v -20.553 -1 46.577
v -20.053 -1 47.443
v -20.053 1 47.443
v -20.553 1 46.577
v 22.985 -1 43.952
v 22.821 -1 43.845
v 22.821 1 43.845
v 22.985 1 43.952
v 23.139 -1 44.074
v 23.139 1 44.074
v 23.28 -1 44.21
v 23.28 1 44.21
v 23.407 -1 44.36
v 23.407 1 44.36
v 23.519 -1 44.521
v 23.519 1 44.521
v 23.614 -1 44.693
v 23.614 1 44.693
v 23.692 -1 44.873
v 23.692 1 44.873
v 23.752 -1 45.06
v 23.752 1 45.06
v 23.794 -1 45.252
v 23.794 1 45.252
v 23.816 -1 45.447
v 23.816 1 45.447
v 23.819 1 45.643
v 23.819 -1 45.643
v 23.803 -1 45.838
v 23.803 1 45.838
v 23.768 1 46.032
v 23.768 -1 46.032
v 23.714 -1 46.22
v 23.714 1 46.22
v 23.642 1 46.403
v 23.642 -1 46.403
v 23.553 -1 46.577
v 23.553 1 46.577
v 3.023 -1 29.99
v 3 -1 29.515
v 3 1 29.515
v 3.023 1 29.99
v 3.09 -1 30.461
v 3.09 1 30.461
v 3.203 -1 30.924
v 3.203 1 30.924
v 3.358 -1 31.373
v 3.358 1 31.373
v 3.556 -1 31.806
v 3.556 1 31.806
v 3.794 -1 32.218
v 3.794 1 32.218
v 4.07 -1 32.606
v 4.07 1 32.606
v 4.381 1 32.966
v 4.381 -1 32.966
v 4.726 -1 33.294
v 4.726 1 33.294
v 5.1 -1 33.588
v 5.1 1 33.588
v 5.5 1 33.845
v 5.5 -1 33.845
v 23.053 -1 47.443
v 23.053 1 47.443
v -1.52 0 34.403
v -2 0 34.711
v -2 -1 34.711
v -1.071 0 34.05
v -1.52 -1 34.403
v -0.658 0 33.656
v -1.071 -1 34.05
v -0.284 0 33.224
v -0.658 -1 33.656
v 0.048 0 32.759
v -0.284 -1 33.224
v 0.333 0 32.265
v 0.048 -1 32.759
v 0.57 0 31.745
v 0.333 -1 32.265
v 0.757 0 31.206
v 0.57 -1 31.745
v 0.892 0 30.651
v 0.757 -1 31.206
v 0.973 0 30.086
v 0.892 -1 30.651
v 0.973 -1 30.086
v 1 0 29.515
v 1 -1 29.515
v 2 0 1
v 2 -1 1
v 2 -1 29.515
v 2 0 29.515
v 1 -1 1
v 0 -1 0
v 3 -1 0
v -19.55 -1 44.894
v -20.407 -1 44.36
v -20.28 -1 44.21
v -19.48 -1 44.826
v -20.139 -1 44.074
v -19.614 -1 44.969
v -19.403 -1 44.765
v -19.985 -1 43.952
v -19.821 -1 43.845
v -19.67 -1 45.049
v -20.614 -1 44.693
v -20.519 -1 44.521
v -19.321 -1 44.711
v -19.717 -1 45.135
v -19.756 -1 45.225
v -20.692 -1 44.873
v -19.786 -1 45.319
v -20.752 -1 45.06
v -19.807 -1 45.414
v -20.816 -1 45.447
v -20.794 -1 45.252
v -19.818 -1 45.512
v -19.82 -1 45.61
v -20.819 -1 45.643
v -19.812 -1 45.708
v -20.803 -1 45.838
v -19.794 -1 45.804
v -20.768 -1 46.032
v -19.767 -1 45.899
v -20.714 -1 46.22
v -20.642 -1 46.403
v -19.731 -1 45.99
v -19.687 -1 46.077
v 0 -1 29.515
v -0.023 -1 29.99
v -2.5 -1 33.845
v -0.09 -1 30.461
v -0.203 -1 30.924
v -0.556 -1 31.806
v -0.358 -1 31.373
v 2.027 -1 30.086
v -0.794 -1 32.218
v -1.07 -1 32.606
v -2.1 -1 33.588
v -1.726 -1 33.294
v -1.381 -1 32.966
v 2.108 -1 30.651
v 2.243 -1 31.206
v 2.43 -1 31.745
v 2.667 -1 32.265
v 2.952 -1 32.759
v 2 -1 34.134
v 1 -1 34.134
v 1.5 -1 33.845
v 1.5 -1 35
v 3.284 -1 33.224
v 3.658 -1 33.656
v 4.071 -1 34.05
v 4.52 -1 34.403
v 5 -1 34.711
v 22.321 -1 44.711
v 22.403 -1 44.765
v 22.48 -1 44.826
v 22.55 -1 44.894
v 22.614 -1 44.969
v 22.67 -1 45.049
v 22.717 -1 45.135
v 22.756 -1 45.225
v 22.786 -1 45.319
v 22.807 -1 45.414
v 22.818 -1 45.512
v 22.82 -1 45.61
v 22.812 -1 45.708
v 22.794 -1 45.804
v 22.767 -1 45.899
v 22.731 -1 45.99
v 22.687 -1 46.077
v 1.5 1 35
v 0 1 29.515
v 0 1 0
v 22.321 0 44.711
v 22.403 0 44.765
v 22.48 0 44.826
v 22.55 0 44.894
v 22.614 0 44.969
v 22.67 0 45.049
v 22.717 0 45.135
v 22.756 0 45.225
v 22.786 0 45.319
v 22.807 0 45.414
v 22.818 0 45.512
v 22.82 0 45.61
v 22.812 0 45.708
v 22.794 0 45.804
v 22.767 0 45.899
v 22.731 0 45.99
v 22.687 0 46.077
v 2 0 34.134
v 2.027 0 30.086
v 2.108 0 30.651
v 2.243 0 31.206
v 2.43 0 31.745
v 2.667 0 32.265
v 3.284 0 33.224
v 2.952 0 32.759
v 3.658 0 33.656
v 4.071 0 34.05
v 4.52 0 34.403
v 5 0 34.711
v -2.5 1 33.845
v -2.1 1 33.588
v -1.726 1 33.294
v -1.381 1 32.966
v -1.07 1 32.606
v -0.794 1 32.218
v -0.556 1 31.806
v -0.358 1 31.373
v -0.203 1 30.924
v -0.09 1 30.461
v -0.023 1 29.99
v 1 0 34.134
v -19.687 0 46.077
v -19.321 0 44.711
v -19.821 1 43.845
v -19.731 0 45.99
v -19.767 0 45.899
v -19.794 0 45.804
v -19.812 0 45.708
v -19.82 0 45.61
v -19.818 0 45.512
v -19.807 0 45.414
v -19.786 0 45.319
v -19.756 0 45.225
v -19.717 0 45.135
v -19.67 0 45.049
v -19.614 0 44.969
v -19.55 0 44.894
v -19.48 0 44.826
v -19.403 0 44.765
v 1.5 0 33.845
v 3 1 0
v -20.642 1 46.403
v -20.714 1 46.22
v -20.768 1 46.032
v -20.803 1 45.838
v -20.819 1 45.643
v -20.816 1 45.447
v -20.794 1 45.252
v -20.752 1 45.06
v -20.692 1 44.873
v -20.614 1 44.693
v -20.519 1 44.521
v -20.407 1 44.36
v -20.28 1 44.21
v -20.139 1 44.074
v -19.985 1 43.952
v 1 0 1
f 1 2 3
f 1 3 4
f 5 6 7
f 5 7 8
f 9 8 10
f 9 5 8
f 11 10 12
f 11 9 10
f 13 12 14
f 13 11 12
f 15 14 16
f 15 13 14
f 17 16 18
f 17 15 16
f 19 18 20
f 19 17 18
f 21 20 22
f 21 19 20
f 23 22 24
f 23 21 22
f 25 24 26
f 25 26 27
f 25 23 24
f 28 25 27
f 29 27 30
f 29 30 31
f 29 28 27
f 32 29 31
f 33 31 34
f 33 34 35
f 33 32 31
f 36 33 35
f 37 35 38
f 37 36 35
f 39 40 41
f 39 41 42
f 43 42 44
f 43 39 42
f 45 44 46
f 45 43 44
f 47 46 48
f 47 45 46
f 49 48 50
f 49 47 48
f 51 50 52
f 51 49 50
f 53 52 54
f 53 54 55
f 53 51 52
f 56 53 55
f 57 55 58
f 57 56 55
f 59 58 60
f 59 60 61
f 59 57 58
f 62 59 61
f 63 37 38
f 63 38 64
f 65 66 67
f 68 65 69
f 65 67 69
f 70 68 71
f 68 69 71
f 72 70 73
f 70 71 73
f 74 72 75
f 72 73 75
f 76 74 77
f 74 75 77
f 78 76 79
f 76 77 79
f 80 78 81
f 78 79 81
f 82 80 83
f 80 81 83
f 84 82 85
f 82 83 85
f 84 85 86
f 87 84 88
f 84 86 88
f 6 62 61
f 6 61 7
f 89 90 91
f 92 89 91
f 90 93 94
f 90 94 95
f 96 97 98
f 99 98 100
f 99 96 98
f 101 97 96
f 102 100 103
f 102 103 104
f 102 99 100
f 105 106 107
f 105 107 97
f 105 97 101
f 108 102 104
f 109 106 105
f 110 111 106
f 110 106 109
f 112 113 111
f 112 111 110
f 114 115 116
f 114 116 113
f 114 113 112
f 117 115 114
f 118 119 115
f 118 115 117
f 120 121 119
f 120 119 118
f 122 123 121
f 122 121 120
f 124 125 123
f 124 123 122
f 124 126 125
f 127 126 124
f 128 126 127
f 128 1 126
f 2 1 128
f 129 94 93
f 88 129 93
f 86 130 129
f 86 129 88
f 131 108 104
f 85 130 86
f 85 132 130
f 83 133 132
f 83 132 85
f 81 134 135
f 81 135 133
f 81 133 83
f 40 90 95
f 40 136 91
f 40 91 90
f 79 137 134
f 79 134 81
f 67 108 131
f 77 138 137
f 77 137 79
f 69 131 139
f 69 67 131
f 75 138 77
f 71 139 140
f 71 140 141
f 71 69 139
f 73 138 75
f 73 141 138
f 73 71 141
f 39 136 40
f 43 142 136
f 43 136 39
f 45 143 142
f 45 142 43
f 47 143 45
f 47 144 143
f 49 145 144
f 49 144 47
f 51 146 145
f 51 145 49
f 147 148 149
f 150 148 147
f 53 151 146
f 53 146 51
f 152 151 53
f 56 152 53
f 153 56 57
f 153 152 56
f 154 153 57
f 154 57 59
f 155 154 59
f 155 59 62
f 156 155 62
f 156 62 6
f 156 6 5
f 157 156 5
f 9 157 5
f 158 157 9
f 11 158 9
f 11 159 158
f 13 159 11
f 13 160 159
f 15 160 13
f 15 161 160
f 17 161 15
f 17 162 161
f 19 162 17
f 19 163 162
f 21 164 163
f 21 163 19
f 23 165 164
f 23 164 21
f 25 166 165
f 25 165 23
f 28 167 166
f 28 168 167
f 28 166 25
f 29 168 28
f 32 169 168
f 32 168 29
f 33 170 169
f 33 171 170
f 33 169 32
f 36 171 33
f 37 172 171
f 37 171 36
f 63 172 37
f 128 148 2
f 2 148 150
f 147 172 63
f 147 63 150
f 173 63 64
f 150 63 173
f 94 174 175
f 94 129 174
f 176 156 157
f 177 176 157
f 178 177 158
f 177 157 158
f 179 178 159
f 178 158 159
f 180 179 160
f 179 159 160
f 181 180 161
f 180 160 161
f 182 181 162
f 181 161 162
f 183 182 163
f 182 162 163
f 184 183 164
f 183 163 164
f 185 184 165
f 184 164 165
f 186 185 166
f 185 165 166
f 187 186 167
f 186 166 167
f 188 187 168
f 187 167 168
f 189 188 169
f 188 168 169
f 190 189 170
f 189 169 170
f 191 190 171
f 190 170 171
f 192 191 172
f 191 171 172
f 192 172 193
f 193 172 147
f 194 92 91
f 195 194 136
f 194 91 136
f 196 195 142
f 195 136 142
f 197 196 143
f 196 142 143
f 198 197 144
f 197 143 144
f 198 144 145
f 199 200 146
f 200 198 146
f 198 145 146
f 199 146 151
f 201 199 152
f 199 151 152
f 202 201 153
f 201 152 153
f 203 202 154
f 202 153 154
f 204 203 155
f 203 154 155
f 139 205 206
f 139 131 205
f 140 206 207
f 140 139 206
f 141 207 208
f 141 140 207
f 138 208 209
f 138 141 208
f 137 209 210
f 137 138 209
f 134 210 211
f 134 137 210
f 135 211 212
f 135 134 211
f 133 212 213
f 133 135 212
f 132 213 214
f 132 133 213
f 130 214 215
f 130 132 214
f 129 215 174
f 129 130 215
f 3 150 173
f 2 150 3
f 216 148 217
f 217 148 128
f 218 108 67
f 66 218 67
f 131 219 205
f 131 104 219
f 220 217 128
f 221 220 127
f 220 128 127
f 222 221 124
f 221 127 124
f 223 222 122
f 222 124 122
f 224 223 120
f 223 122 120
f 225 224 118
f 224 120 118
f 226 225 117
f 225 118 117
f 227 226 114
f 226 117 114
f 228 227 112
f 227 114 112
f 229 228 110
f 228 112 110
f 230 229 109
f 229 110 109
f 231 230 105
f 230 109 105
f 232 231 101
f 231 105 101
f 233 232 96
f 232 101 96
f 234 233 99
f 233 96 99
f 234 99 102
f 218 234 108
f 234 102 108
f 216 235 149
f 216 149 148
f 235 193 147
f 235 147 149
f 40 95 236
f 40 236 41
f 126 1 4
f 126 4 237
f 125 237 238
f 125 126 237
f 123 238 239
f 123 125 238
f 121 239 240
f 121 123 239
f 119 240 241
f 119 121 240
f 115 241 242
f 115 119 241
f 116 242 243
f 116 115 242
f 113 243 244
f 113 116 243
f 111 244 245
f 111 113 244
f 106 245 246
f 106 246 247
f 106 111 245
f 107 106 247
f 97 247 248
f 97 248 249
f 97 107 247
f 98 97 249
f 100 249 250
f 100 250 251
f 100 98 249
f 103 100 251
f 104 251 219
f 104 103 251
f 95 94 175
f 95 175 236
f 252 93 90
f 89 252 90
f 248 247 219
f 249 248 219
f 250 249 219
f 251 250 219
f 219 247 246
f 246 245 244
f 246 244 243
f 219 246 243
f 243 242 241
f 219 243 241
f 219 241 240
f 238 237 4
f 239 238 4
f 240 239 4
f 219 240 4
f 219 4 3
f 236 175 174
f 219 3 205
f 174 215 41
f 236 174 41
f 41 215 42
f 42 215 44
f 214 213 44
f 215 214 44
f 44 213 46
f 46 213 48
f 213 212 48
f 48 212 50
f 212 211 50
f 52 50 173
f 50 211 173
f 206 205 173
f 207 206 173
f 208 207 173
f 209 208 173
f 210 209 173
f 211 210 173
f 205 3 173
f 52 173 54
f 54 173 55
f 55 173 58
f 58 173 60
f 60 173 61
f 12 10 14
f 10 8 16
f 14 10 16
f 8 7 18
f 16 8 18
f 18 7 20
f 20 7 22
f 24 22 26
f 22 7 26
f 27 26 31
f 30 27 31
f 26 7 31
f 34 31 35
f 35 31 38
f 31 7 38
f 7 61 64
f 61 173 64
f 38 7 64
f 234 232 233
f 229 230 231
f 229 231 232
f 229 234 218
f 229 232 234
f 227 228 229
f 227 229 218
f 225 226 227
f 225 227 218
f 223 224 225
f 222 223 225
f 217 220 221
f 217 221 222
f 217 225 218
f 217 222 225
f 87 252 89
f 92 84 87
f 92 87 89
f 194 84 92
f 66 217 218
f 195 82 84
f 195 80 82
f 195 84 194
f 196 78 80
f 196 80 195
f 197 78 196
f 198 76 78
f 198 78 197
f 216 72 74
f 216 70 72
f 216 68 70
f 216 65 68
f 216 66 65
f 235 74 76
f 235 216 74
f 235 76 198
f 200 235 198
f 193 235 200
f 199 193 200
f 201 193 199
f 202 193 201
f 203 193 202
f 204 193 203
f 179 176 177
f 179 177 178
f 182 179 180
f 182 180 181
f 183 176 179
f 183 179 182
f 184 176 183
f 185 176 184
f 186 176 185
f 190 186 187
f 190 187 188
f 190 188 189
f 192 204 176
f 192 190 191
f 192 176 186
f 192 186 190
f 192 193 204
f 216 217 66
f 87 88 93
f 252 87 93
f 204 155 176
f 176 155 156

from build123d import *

# Parameters (mm, degrees)
F1_DEPTH    = 1
F2_T        = 1
F2_T3_DEPTH = 4


# Not quite as in the source:
# - a shell that OpenCascade refuses in one call is made with other operations: the cavity is built on its own and cut out


with BuildPart() as f1:
    # F0 (on Front) → F1 (new body, symmetric)
    with BuildSketch(Plane.XZ):
        with BuildLine():
            Line((0, 29.5151724427), (0, 0))
            Line((0, 0), (3, 0))
            Line((3, 0), (3, 29.5151724427))
            ThreePointArc((3, 29.5151724427), (3.6698729811, 32.0151724427), (5.5, 33.8452994616))
            Line((5.5, 33.8452994616), (22.8205080757, 43.8452994616))
            ThreePointArc((22.8205080757, 43.8452994616), (23.7523597283, 45.059712179), (23.5525588833, 46.5773502692))
            Line((23.5525588833, 46.5773502692), (23.0525588833, 47.443375673))
            Line((23.0525588833, 47.443375673), (1.5, 35))
            Line((1.5, 35), (-20.0525588833, 47.443375673))
            Line((-20.0525588833, 47.443375673), (-20.5525588833, 46.5773502692))
            ThreePointArc((-20.5525588833, 46.5773502692), (-20.7523597283, 45.059712179), (-19.8205080757, 43.8452994616))
            Line((-19.8205080757, 43.8452994616), (-2.5, 33.8452994616))
            ThreePointArc((-2.5, 33.8452994616), (-0.6698729811, 32.0151724427), (0, 29.5151724427))
        make_face()
    extrude(amount=F1_DEPTH, both=True)

    # F2: shell of thickness 1, made by hand


with BuildPart() as f2_core1:
    # F2_t2: copy of F1
    add(f1.part)

    # the walls: a layer under each face that stays
    f2_faces = [f2_core1.faces().sort_by_distance(p)[0] for p in [
        (12.2762794416, 0, 41.2216878365),
        (23.3025588833, 0, 47.0103629711),
        (23.7523597283, 0, 45.059712179),
        (14.1602540378, 0, 38.8452994616),
        (3.6698729811, 0, 32.0151724427),
        (3, 0, 14.7575862213),
        (1.5, 0, 0),
        (0, 0, 14.7575862213),
        (-0.6698729811, 0, 32.0151724427),
        (-11.1602540378, 0, 38.8452994616),
        (-20.7523597283, 0, 45.059712179),
        (-20.3025588833, 0, 47.0103629711),
        (-9.2762794416, 0, 41.2216878365),
        (1.5, 1, 23.7216878365),
    ]]
    thicken(f2_faces, amount=-F2_T, mode=Mode.SUBTRACT)

    # F2_s4 → F2_t3 (cut)
    with BuildSketch(Plane.XZ.offset(-2)):
        Polygon((1.5, 35.0173205081), (2, 34.1339745962), (1.5, 33.8452994616), (1, 34.1339745962), align=None)
    extrude(amount=F2_T3_DEPTH, mode=Mode.SUBTRACT)


with BuildPart() as f1_1:
    add(f1.part)

    # what is left inside the walls is the cavity
    f2_cavity = [f2_core1.part.solids().sort_by_distance(p)[0] for p in [
        (1.5, -0.01, 16.025783),
    ]]
    add(f2_cavity, mode=Mode.SUBTRACT)


solid = f1_1.part
